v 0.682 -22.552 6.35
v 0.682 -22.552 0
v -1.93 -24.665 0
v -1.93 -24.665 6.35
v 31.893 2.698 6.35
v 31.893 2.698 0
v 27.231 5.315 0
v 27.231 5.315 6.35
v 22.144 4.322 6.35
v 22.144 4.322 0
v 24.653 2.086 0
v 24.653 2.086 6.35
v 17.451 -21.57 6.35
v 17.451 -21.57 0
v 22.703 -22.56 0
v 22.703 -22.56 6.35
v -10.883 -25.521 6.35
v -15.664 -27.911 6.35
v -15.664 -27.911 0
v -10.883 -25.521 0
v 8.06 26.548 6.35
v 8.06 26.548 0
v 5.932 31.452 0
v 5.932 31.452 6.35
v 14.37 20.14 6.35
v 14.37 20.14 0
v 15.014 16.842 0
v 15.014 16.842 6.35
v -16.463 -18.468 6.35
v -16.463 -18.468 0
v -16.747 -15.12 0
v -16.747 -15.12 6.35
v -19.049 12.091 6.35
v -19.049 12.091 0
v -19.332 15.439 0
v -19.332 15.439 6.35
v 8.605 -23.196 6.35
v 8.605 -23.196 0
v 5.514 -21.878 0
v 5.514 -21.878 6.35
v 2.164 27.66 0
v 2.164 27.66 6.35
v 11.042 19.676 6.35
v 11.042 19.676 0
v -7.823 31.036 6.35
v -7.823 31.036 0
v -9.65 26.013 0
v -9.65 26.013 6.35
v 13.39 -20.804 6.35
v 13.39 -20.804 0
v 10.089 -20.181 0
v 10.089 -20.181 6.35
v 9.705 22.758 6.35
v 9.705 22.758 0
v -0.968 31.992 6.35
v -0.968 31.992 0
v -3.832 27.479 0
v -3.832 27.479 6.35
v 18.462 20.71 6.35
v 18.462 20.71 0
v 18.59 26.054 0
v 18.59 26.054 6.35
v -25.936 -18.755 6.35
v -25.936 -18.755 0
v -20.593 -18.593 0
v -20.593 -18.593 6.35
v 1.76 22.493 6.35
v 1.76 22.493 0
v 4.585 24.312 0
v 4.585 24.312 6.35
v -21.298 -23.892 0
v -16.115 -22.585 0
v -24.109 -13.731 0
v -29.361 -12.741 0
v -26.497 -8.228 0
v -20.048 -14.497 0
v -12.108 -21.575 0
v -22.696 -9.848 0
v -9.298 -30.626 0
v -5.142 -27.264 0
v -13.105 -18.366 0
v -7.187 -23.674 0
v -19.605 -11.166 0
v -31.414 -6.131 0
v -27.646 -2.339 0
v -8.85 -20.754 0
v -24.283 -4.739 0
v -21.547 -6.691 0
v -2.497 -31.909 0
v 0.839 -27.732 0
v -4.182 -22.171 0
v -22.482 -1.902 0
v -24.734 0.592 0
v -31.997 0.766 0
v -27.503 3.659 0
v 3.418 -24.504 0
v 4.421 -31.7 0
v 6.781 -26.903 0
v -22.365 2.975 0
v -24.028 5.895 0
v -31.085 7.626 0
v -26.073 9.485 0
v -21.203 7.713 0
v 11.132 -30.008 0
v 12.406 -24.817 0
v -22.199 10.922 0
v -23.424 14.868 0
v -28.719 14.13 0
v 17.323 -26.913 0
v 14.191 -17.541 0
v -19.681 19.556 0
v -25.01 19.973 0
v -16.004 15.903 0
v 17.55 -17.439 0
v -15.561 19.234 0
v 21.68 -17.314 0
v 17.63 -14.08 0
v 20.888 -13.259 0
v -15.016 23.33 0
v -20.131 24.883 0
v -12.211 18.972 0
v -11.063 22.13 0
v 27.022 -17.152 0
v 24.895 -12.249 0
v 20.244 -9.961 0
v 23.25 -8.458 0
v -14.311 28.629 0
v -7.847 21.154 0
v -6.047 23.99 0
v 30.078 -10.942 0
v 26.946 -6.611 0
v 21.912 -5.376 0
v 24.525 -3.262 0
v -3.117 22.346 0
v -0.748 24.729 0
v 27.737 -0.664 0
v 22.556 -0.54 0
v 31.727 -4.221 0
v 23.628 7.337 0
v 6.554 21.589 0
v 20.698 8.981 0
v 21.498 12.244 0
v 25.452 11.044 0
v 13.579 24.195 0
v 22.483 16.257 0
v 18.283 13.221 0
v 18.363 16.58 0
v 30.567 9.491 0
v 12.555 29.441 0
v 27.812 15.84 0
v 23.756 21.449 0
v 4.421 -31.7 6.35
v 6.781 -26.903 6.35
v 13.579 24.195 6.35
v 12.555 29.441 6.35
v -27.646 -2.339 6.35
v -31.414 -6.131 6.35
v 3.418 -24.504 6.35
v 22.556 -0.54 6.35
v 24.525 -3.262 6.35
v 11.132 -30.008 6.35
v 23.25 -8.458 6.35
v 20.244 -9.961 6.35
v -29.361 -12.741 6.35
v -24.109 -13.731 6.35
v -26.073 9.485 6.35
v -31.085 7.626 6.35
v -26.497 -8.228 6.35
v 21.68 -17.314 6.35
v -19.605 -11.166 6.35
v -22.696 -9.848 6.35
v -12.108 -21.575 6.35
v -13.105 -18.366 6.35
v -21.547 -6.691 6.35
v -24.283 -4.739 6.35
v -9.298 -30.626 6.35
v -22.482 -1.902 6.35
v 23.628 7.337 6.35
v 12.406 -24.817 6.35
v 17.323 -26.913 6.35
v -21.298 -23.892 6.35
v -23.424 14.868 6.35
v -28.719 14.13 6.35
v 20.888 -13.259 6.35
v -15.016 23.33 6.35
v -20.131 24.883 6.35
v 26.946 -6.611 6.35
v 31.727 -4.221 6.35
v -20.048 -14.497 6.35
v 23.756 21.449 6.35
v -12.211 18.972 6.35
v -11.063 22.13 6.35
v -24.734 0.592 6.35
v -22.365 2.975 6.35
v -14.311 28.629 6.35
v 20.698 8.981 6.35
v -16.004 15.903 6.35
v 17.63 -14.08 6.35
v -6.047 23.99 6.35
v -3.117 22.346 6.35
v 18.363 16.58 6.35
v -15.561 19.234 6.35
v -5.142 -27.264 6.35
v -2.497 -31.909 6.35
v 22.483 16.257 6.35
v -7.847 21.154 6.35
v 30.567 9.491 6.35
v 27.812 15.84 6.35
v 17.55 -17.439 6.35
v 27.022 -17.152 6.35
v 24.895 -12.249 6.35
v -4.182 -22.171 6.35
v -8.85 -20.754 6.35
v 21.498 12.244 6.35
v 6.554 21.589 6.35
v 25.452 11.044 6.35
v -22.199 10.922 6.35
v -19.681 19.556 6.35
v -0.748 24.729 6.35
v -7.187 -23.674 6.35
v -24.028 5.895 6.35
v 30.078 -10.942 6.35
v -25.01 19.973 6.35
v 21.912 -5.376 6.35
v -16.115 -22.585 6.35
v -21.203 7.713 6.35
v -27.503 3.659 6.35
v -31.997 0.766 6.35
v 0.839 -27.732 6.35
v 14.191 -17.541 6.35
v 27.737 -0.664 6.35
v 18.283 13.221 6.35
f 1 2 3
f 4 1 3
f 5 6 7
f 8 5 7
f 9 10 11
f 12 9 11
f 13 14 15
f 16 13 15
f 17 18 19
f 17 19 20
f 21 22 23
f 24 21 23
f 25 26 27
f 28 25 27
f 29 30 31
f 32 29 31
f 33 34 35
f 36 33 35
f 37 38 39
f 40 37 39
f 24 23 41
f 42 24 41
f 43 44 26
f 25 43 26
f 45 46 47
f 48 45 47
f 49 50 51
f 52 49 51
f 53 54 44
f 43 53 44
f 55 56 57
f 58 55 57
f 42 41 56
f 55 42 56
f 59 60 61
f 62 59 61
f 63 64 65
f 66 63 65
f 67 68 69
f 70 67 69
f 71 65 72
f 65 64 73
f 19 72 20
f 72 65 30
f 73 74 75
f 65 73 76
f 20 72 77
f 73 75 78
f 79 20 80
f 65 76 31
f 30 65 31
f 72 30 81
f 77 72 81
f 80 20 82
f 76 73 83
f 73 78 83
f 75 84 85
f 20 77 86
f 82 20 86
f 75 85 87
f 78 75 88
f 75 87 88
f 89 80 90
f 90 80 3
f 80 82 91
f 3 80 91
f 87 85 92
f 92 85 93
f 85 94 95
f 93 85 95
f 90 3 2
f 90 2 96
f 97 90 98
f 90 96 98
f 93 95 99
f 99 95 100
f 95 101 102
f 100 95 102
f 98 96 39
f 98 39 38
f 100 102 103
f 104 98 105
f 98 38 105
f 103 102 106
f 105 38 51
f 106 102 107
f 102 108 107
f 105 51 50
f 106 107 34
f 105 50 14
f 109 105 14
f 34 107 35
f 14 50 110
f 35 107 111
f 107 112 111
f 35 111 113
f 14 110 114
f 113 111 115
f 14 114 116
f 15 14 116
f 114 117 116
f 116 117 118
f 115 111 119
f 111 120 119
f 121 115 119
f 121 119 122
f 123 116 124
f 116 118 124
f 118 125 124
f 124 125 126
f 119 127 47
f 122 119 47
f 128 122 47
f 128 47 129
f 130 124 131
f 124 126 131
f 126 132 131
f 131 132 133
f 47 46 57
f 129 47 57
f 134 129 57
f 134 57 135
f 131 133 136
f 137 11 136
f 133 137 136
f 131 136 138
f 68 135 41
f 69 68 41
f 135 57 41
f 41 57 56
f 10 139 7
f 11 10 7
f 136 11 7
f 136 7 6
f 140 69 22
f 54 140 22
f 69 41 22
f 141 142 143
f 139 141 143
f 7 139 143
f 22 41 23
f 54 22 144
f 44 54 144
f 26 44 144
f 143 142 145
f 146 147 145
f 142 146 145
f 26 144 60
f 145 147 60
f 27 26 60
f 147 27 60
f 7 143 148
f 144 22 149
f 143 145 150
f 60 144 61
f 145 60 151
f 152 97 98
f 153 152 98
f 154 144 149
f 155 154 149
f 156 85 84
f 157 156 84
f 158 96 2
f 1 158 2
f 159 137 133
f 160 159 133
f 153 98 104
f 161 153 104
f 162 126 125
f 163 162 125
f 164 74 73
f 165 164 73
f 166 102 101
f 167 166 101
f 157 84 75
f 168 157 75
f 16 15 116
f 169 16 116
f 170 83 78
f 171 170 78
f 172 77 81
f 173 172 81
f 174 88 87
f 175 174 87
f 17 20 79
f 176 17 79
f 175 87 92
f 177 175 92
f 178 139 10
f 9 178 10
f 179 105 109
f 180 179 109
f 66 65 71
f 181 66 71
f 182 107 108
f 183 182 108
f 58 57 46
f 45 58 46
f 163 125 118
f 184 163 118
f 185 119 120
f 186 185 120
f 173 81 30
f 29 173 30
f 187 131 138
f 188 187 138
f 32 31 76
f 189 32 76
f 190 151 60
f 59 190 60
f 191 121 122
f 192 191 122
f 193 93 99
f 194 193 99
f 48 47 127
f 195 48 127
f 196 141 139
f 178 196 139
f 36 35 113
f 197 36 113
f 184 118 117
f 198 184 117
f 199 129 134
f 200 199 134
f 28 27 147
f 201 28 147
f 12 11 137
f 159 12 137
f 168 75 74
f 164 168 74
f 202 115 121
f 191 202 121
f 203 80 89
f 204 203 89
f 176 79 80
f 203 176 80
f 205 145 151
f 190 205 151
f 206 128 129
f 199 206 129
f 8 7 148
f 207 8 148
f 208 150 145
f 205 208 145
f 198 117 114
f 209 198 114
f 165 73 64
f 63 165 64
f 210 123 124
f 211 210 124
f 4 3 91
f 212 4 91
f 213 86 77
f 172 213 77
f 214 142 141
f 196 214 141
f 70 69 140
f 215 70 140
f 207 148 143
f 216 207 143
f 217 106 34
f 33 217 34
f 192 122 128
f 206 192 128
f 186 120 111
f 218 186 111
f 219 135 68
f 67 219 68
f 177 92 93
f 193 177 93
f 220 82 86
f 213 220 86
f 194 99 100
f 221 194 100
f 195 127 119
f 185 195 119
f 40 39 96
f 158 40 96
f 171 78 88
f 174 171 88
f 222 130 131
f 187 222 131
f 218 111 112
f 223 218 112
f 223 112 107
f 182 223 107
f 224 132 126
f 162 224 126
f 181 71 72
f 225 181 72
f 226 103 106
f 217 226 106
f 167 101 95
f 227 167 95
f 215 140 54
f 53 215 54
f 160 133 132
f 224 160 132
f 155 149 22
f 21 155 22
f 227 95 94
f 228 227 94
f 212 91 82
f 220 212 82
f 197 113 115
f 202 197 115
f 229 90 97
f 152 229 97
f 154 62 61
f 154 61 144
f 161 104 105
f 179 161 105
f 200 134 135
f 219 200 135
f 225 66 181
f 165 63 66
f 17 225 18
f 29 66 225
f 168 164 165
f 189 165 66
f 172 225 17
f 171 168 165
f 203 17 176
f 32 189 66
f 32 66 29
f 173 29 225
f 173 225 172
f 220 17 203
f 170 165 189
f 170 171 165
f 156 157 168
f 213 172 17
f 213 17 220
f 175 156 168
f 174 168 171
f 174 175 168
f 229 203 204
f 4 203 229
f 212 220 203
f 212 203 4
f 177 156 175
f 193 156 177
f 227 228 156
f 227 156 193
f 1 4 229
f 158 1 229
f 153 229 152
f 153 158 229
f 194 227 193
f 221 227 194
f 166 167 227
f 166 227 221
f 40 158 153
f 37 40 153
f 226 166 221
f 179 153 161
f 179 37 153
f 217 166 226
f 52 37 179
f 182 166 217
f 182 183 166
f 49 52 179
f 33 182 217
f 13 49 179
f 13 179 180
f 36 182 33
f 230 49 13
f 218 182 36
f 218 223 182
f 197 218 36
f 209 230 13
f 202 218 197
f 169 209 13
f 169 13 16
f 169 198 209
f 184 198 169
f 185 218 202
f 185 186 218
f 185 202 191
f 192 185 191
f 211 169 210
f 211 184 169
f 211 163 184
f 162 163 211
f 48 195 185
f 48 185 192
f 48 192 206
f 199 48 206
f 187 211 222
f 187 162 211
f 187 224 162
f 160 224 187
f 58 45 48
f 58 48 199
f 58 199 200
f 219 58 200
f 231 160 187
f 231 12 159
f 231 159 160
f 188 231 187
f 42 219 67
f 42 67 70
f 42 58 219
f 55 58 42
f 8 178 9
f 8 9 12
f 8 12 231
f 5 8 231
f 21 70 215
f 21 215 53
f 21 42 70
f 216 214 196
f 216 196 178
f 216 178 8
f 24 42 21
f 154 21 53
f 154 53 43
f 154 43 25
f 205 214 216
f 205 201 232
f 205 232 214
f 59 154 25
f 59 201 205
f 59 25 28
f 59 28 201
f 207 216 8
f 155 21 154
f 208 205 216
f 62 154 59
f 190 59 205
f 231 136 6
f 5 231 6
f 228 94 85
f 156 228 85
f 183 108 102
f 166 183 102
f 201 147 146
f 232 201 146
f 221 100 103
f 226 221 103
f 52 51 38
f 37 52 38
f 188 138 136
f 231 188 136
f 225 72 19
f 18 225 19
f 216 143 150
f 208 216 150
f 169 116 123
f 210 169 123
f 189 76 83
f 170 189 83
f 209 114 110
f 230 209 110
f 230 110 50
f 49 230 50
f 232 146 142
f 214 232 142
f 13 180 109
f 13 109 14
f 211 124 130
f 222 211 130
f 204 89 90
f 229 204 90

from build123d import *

# Parameters (mm, degrees)
F1_DEPTH = 6.35


with BuildPart() as f1:
    # F0 (on Top) → F1 (new body)
    with BuildSketch(Plane.XY):
        Polygon((-24.1086892498, -13.7312582458), (-25.9361392682, -18.7545309792), (-20.5932268628, -18.5928845996), (-20.0483695073, -14.4970599949), align=None)
        Polygon((-16.4632104005, -18.4679336069), (-20.5932268628, -18.5928845996), (-21.2980969645, -23.8915637428), (-16.1148480755, -22.585128334), align=None)
        Polygon((-12.1082498728, -21.5752671691), (-16.1148480755, -22.585128334), (-15.6641793179, -27.9114535394), (-10.8829569025, -25.521316569), align=None)
        Polygon((-7.1871210385, -23.6737652176), (-10.8829569025, -25.521316569), (-9.2978220559, -30.6262347898), (-5.1421907603, -27.2641564062), align=None)
        Polygon((-1.9299304123, -24.665304316), (-5.1421907603, -27.2641564062), (-2.4967089684, -31.9089673401), (0.8390185068, -27.7321545918), align=None)
        Polygon((8.6051350651, -23.1959806628), (6.7809962009, -26.9034280507), (11.1322759384, -30.0081353106), (12.4059020493, -24.816727115), align=None)
        Polygon((13.3904019635, -20.8038218521), (12.4059020493, -24.816727115), (17.3228715709, -26.9134515238), (17.4507217059, -21.5696236012), align=None)
        Polygon((17.5495485484, -17.4388994534), (17.4507217059, -21.5696236012), (22.7034689817, -22.5603246559), (21.6795650107, -17.3139484608), align=None)
        Polygon((24.8946959507, -12.2486923333), (20.8880977481, -13.2585534982), (21.6795650107, -17.3139484608), (27.0224774161, -17.1523020812), align=None)
        Polygon((26.9457785766, -6.6107009659), (23.2499427125, -8.4582523173), (24.8946959507, -12.2486923333), (30.0779448398, -10.9422569245), align=None)
        Polygon((24.5246461962, -3.2624526586), (26.9457785766, -6.6107009659), (31.727000992, -4.2205639955), (27.7369065442, -0.6636005685), align=None)
        Polygon((27.2310875892, 5.3145290539), (24.6526044809, 2.0858956603), (27.7369065442, -0.6636005685), (31.8925378399, 2.6984778152), align=None)
        Polygon((23.6278343795, 7.3367098166), (27.2310875892, 5.3145290539), (30.5668150644, 9.4913418023), (25.4519732437, 11.0441572045), align=None)
        Polygon((22.4827529172, 16.2573728388), (21.498253003, 12.2444675759), (25.4519732437, 11.0441572045), (27.811821989, 15.8404011956), align=None)
        Polygon((23.7563790281, 21.4487810344), (18.4622640521, 20.710411788), (18.3634372096, 16.5796876402), (22.4827529172, 16.2573728388), align=None)
        Polygon((13.5785002392, 24.1950549), (14.3699675018, 20.1396599374), (18.4622640521, 20.710411788), (18.5901141871, 26.0542397106), align=None)
        Polygon((12.5545962682, 29.4414310951), (8.0598208465, 26.5483641356), (9.7045740847, 22.7579241196), (13.5785002392, 24.1950549), align=None)
        Polygon((2.1642731889, 27.6603013707), (4.5854055693, 24.3120530635), (8.0598208465, 26.5483641356), (5.9320393812, 31.4519738835), align=None)
        Polygon((-0.9678930743, 31.9918573294), (-3.8324734776, 27.478873656), (-0.7481714143, 24.7293774271), (2.1642731889, 27.6603013707), align=None)
        Polygon((-7.8225679254, 31.035837083), (-9.6500179437, 26.0125643496), (-6.046764734, 23.990383587), (-3.8324734776, 27.478873656), align=None)
        Polygon((-15.0163382961, 23.3299364452), (-11.0626180553, 22.1296260737), (-9.6500179437, 26.0125643496), (-14.3114681944, 28.6286155884), align=None)
        Polygon((-20.1311801167, 24.8827518473), (-19.6805113592, 19.5564266419), (-15.5611956516, 19.2341118405), (-15.0163382961, 23.3299364452), align=None)
        Polygon((-25.0095804309, 19.9733982851), (-23.4244455844, 14.8684800642), (-19.3321490342, 15.4392319148), (-19.6805113592, 19.5564266419), align=None)
        Polygon((-28.7185605604, 14.1301108179), (-26.0730787685, 9.4852998839), (-22.1991526141, 10.9224306643), (-23.4244455844, 14.8684800642), align=None)
        Polygon((-31.0846927164, 7.6261150733), (-27.5025637676, 3.6585976232), (-24.0281484903, 5.8949086953), (-26.0730787685, 9.4852998839), align=None)
        Polygon((-31.9973391892, 0.7655306637), (-27.6460594517, -2.3391765962), (-24.7336148485, 0.5917473475), (-27.5025637676, 3.6585976232), align=None)
        Polygon((-31.413825644, -6.1308491089), (-26.4968561223, -8.2275735177), (-24.2825648659, -4.7390834487), (-27.6460594517, -2.3391765962), align=None)
        Polygon((-29.3614365256, -12.7405571911), (-24.1086892498, -13.7312582458), (-22.6960891382, -9.8483199699), (-26.4968561223, -8.2275735177), align=None)
        Polygon((3.4175016151, -24.5035211982), (0.8390185068, -27.7321545918), (4.4211474556, -31.6996720419), (6.7809962009, -26.9034280507), align=None)
        Polygon((-8.8500670839, -20.754043752), (-12.1082498728, -21.5752671691), (-10.8829569025, -25.521316569), (-7.1871210385, -23.6737652176), align=None)
        Polygon((0.682293437, -22.5519066847), (-1.9299304123, -24.665304316), (0.8390185068, -27.7321545918), (3.4175016151, -24.5035211982), align=None)
        Polygon((-4.181651512, -22.1713285593), (-7.1871210385, -23.6737652176), (-5.1421907603, -27.2641564062), (-1.9299304123, -24.665304316), align=None)
        Polygon((5.5143351032, -21.8779827183), (3.4175016151, -24.5035211982), (6.7809962009, -26.9034280507), (8.6051350651, -23.1959806628), align=None)
        Polygon((10.0885325887, -20.1810685955), (8.6051350651, -23.1959806628), (12.4059020493, -24.816727115), (13.3904019635, -20.8038218521), align=None)
        Polygon((20.8880977481, -13.2585534982), (17.6299149592, -14.0797769153), (17.5495485484, -17.4388994534), (21.6795650107, -17.3139484608), align=None)
        Polygon((-27.6460594517, -2.3391765962), (-24.2825648659, -4.7390834487), (-22.4818937488, -1.9022284093), (-24.7336148485, 0.5917473475), align=None)
        Polygon((-26.4968561223, -8.2275735177), (-22.6960891382, -9.8483199699), (-21.5473566878, -6.6906979621), (-24.2825648659, -4.7390834487), align=None)
        Polygon((-22.6960891382, -9.8483199699), (-24.1086892498, -13.7312582458), (-20.0483695073, -14.4970599949), (-19.6052891763, -11.1663179144), align=None)
        Polygon((-20.0483695073, -14.4970599949), (-20.5932268628, -18.5928845996), (-16.4632104005, -18.4679336069), (-16.7465001326, -15.1198132515), align=None)
        Polygon((-13.1046633551, -18.3663229254), (-16.4632104005, -18.4679336069), (-16.1148480755, -22.585128334), (-12.1082498728, -21.5752671691), align=None)
        Polygon((14.191001503, -17.5405101349), (13.3904019635, -20.8038218521), (17.4507217059, -21.5696236012), (17.5495485484, -17.4388994534), align=None)
        Polygon((23.2499427125, -8.4582523173), (20.2444731861, -9.9606889756), (20.8880977481, -13.2585534982), (24.8946959507, -12.2486923333), align=None)
        Polygon((21.912422347, -5.3758502899), (23.2499427125, -8.4582523173), (26.9457785766, -6.6107009659), (24.5246461962, -3.2624526586), align=None)
        Polygon((24.6526044809, 2.0858956603), (22.5557709928, -0.5396428196), (24.5246461962, -3.2624526586), (27.7369065442, -0.6636005685), align=None)
        Polygon((22.1444368559, 4.3217977493), (24.6526044809, 2.0858956603), (27.2310875892, 5.3145290539), (23.6278343795, 7.3367098166), align=None)
        Polygon((21.498253003, 12.2444675759), (20.6976534634, 8.9811558587), (23.6278343795, 7.3367098166), (25.4519732437, 11.0441572045), align=None)
        Polygon((18.3634372096, 16.5796876402), (18.2830707988, 13.220565102), (21.498253003, 12.2444675759), (22.4827529172, 16.2573728388), align=None)
        Polygon((18.4622640521, 20.710411788), (14.3699675018, 20.1396599374), (15.0135920638, 16.8417954148), (18.3634372096, 16.5796876402), align=None)
        Polygon((9.7045740847, 22.7579241196), (11.0420944503, 19.6755220922), (14.3699675018, 20.1396599374), (13.5785002392, 24.1950549), align=None)
        Polygon((8.0598208465, 26.5483641356), (4.5854055693, 24.3120530635), (6.5542807727, 21.5892432244), (9.7045740847, 22.7579241196), align=None)
        Polygon((-0.7481714143, 24.7293774271), (1.7599962107, 22.4934753382), (4.5854055693, 24.3120530635), (2.1642731889, 27.6603013707), align=None)
        Polygon((-3.8324734776, 27.478873656), (-6.046764734, 23.990383587), (-3.116583818, 22.3459375448), (-0.7481714143, 24.7293774271), align=None)
        Polygon((-9.6500179437, 26.0125643496), (-11.0626180553, 22.1296260737), (-7.8474358512, 21.1535285476), (-6.046764734, 23.990383587), align=None)
        Polygon((-15.5611956516, 19.2341118405), (-12.2113505057, 18.9720040659), (-11.0626180553, 22.1296260737), (-15.0163382961, 23.3299364452), align=None)
        Polygon((-19.6805113592, 19.5564266419), (-19.3321490342, 15.4392319148), (-16.0042759826, 15.90336976), (-15.5611956516, 19.2341118405), align=None)
        Polygon((-23.4244455844, 14.8684800642), (-22.1991526141, 10.9224306643), (-19.048859302, 12.0911115594), (-19.3321490342, 15.4392319148), align=None)
        Polygon((-26.0730787685, 9.4852998839), (-24.0281484903, 5.8949086953), (-21.2027391318, 7.7134864207), (-22.1991526141, 10.9224306643), align=None)
        Polygon((-27.5025637676, 3.6585976232), (-24.7336148485, 0.5917473475), (-22.3652024449, 2.9751872298), (-24.0281484903, 5.8949086953), align=None)
    extrude(amount=F1_DEPTH)


solid = f1.part
